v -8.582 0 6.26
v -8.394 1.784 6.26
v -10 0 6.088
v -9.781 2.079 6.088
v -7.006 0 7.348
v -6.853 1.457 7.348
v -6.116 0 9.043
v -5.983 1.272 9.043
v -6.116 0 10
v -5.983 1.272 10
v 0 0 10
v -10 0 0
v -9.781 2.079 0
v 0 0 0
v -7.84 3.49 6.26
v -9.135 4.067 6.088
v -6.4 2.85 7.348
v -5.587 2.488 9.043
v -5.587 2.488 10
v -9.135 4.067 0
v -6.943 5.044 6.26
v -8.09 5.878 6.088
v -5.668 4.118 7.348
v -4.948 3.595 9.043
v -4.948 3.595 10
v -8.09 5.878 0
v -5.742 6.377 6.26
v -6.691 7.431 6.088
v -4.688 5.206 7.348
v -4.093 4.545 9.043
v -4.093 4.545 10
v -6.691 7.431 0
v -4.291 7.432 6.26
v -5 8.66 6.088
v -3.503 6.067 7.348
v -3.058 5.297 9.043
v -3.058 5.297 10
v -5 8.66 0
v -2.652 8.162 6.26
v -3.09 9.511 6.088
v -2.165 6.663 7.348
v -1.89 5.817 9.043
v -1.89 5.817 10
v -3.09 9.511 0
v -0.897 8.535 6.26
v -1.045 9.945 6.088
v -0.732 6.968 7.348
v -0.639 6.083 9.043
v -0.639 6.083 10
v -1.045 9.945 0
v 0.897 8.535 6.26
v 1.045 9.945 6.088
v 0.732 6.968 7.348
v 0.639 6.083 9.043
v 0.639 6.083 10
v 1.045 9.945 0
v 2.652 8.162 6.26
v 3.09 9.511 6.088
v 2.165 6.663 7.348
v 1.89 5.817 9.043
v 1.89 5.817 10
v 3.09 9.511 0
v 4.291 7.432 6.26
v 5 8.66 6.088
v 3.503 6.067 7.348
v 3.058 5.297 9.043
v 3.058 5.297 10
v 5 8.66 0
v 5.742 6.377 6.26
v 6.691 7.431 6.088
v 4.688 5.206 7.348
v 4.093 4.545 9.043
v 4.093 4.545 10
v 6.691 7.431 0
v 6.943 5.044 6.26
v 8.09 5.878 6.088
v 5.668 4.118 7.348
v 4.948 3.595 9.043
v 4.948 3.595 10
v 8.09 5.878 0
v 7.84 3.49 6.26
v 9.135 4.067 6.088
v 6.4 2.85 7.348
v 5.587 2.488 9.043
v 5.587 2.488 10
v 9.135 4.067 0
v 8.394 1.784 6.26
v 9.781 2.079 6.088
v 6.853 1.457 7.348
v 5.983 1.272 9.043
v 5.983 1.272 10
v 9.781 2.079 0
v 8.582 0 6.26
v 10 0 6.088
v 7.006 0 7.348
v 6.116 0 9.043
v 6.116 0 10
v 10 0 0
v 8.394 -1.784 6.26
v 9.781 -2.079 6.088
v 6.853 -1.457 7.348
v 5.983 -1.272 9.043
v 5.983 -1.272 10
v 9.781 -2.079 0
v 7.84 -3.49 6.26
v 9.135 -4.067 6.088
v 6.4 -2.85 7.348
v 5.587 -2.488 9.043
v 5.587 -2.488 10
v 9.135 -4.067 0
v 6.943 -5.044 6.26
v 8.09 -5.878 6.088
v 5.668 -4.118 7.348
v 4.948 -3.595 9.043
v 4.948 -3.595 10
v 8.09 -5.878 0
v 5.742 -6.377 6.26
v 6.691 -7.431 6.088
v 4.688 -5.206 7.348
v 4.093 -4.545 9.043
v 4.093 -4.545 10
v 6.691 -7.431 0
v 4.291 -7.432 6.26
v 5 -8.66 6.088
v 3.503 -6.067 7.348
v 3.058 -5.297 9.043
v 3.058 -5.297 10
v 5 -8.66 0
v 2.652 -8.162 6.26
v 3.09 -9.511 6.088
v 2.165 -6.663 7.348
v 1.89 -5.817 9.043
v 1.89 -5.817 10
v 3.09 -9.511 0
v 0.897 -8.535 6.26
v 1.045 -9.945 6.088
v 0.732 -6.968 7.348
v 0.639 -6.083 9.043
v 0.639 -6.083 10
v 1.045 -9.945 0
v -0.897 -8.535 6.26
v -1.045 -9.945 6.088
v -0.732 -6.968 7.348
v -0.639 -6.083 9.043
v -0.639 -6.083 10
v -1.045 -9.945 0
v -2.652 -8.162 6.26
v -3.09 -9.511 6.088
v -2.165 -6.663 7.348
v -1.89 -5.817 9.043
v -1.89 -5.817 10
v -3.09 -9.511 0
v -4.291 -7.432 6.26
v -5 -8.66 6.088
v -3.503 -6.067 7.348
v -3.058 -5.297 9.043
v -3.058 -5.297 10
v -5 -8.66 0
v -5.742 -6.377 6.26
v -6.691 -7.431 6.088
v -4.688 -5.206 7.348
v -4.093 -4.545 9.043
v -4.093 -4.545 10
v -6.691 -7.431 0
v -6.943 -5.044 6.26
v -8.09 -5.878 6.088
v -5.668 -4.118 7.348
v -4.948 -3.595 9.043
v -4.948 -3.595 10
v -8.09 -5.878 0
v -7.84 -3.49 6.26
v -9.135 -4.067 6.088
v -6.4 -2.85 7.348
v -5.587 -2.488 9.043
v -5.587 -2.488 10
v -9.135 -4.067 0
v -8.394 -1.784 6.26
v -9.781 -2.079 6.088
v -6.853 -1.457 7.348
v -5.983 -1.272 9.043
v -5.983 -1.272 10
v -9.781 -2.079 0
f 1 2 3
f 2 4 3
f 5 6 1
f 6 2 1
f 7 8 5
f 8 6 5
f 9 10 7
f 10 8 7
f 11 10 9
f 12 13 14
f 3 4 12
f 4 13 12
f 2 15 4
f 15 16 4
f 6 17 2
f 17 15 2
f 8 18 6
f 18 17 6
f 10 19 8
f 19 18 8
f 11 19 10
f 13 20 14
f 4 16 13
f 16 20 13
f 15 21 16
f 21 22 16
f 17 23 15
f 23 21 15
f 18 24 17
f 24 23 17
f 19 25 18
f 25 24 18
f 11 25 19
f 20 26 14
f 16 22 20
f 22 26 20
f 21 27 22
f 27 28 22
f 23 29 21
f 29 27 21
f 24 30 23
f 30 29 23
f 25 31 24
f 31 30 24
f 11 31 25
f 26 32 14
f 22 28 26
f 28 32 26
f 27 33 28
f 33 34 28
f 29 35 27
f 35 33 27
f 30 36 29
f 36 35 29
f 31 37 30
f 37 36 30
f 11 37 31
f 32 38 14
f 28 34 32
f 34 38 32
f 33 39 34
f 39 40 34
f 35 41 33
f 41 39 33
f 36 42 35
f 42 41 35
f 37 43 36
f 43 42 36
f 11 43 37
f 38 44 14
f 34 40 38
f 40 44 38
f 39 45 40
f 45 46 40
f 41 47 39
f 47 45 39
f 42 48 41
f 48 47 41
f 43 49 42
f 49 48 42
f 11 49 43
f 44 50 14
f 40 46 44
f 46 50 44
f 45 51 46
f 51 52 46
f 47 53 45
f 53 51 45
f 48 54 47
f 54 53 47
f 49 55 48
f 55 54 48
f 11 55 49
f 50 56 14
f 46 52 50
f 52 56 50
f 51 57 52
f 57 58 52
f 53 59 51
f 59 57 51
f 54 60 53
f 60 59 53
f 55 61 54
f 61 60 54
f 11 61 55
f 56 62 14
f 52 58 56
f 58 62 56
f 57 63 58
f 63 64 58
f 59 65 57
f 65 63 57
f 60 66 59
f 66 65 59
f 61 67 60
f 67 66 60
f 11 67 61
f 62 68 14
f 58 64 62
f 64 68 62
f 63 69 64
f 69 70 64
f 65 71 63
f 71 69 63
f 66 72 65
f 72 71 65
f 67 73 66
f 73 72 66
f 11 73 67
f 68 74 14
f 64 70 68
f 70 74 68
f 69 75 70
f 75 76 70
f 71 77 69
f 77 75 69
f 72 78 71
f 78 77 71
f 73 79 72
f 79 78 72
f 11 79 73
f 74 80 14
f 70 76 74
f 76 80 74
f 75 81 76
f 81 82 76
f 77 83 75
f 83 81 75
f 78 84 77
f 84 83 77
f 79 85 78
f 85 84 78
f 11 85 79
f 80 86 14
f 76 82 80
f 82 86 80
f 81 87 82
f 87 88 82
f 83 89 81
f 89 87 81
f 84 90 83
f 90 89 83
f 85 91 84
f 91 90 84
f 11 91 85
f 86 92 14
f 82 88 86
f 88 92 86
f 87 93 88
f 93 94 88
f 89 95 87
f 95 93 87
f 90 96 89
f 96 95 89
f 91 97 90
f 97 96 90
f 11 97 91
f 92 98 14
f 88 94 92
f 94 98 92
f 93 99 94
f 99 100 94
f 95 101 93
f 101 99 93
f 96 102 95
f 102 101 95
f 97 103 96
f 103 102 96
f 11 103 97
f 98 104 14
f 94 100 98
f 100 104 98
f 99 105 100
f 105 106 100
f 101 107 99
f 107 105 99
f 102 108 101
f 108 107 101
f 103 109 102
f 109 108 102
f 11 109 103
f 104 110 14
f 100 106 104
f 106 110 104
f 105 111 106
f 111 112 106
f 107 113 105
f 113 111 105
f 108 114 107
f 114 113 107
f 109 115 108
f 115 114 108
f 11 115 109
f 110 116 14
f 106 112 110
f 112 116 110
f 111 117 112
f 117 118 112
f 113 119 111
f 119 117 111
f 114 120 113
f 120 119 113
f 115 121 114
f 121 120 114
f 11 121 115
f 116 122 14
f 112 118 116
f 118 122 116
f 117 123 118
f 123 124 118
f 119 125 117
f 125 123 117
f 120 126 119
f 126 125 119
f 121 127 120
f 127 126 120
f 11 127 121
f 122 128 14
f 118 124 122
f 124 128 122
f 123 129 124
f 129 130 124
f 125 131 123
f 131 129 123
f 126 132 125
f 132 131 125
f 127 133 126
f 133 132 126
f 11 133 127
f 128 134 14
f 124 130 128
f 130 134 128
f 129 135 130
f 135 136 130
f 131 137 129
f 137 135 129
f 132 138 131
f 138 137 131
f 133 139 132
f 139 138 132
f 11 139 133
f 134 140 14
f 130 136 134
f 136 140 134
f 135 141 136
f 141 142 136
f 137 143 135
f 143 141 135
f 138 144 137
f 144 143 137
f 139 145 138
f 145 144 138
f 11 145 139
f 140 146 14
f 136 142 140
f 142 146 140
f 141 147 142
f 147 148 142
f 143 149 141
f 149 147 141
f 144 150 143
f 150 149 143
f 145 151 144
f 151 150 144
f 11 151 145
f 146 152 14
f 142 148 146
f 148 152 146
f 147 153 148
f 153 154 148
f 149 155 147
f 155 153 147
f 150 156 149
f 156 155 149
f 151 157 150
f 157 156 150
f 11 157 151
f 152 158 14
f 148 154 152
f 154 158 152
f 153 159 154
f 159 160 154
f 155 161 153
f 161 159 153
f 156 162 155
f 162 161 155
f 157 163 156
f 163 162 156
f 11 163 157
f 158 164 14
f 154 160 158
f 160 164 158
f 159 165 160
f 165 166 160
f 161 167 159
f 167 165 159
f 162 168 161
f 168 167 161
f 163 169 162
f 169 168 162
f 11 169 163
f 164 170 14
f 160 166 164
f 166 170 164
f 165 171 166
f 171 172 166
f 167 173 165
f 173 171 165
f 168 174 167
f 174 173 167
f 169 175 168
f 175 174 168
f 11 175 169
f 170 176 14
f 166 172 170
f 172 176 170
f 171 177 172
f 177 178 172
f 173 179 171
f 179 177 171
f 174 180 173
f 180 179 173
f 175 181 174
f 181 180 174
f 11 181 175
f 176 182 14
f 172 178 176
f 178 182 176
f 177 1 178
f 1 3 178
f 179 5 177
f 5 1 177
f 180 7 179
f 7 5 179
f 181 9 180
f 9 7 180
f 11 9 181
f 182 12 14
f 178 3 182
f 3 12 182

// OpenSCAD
// Stage 2 of docs/audits/exact-geometry-rust.md: extrusions.
// A groove: a quarter circle cut from a revolved square (a torus beside a cylinder and planes).
// volume: 2486.065588055809
rotate_extrude() difference() { square([10, 10]); translate([10, 10]) circle(4); }
